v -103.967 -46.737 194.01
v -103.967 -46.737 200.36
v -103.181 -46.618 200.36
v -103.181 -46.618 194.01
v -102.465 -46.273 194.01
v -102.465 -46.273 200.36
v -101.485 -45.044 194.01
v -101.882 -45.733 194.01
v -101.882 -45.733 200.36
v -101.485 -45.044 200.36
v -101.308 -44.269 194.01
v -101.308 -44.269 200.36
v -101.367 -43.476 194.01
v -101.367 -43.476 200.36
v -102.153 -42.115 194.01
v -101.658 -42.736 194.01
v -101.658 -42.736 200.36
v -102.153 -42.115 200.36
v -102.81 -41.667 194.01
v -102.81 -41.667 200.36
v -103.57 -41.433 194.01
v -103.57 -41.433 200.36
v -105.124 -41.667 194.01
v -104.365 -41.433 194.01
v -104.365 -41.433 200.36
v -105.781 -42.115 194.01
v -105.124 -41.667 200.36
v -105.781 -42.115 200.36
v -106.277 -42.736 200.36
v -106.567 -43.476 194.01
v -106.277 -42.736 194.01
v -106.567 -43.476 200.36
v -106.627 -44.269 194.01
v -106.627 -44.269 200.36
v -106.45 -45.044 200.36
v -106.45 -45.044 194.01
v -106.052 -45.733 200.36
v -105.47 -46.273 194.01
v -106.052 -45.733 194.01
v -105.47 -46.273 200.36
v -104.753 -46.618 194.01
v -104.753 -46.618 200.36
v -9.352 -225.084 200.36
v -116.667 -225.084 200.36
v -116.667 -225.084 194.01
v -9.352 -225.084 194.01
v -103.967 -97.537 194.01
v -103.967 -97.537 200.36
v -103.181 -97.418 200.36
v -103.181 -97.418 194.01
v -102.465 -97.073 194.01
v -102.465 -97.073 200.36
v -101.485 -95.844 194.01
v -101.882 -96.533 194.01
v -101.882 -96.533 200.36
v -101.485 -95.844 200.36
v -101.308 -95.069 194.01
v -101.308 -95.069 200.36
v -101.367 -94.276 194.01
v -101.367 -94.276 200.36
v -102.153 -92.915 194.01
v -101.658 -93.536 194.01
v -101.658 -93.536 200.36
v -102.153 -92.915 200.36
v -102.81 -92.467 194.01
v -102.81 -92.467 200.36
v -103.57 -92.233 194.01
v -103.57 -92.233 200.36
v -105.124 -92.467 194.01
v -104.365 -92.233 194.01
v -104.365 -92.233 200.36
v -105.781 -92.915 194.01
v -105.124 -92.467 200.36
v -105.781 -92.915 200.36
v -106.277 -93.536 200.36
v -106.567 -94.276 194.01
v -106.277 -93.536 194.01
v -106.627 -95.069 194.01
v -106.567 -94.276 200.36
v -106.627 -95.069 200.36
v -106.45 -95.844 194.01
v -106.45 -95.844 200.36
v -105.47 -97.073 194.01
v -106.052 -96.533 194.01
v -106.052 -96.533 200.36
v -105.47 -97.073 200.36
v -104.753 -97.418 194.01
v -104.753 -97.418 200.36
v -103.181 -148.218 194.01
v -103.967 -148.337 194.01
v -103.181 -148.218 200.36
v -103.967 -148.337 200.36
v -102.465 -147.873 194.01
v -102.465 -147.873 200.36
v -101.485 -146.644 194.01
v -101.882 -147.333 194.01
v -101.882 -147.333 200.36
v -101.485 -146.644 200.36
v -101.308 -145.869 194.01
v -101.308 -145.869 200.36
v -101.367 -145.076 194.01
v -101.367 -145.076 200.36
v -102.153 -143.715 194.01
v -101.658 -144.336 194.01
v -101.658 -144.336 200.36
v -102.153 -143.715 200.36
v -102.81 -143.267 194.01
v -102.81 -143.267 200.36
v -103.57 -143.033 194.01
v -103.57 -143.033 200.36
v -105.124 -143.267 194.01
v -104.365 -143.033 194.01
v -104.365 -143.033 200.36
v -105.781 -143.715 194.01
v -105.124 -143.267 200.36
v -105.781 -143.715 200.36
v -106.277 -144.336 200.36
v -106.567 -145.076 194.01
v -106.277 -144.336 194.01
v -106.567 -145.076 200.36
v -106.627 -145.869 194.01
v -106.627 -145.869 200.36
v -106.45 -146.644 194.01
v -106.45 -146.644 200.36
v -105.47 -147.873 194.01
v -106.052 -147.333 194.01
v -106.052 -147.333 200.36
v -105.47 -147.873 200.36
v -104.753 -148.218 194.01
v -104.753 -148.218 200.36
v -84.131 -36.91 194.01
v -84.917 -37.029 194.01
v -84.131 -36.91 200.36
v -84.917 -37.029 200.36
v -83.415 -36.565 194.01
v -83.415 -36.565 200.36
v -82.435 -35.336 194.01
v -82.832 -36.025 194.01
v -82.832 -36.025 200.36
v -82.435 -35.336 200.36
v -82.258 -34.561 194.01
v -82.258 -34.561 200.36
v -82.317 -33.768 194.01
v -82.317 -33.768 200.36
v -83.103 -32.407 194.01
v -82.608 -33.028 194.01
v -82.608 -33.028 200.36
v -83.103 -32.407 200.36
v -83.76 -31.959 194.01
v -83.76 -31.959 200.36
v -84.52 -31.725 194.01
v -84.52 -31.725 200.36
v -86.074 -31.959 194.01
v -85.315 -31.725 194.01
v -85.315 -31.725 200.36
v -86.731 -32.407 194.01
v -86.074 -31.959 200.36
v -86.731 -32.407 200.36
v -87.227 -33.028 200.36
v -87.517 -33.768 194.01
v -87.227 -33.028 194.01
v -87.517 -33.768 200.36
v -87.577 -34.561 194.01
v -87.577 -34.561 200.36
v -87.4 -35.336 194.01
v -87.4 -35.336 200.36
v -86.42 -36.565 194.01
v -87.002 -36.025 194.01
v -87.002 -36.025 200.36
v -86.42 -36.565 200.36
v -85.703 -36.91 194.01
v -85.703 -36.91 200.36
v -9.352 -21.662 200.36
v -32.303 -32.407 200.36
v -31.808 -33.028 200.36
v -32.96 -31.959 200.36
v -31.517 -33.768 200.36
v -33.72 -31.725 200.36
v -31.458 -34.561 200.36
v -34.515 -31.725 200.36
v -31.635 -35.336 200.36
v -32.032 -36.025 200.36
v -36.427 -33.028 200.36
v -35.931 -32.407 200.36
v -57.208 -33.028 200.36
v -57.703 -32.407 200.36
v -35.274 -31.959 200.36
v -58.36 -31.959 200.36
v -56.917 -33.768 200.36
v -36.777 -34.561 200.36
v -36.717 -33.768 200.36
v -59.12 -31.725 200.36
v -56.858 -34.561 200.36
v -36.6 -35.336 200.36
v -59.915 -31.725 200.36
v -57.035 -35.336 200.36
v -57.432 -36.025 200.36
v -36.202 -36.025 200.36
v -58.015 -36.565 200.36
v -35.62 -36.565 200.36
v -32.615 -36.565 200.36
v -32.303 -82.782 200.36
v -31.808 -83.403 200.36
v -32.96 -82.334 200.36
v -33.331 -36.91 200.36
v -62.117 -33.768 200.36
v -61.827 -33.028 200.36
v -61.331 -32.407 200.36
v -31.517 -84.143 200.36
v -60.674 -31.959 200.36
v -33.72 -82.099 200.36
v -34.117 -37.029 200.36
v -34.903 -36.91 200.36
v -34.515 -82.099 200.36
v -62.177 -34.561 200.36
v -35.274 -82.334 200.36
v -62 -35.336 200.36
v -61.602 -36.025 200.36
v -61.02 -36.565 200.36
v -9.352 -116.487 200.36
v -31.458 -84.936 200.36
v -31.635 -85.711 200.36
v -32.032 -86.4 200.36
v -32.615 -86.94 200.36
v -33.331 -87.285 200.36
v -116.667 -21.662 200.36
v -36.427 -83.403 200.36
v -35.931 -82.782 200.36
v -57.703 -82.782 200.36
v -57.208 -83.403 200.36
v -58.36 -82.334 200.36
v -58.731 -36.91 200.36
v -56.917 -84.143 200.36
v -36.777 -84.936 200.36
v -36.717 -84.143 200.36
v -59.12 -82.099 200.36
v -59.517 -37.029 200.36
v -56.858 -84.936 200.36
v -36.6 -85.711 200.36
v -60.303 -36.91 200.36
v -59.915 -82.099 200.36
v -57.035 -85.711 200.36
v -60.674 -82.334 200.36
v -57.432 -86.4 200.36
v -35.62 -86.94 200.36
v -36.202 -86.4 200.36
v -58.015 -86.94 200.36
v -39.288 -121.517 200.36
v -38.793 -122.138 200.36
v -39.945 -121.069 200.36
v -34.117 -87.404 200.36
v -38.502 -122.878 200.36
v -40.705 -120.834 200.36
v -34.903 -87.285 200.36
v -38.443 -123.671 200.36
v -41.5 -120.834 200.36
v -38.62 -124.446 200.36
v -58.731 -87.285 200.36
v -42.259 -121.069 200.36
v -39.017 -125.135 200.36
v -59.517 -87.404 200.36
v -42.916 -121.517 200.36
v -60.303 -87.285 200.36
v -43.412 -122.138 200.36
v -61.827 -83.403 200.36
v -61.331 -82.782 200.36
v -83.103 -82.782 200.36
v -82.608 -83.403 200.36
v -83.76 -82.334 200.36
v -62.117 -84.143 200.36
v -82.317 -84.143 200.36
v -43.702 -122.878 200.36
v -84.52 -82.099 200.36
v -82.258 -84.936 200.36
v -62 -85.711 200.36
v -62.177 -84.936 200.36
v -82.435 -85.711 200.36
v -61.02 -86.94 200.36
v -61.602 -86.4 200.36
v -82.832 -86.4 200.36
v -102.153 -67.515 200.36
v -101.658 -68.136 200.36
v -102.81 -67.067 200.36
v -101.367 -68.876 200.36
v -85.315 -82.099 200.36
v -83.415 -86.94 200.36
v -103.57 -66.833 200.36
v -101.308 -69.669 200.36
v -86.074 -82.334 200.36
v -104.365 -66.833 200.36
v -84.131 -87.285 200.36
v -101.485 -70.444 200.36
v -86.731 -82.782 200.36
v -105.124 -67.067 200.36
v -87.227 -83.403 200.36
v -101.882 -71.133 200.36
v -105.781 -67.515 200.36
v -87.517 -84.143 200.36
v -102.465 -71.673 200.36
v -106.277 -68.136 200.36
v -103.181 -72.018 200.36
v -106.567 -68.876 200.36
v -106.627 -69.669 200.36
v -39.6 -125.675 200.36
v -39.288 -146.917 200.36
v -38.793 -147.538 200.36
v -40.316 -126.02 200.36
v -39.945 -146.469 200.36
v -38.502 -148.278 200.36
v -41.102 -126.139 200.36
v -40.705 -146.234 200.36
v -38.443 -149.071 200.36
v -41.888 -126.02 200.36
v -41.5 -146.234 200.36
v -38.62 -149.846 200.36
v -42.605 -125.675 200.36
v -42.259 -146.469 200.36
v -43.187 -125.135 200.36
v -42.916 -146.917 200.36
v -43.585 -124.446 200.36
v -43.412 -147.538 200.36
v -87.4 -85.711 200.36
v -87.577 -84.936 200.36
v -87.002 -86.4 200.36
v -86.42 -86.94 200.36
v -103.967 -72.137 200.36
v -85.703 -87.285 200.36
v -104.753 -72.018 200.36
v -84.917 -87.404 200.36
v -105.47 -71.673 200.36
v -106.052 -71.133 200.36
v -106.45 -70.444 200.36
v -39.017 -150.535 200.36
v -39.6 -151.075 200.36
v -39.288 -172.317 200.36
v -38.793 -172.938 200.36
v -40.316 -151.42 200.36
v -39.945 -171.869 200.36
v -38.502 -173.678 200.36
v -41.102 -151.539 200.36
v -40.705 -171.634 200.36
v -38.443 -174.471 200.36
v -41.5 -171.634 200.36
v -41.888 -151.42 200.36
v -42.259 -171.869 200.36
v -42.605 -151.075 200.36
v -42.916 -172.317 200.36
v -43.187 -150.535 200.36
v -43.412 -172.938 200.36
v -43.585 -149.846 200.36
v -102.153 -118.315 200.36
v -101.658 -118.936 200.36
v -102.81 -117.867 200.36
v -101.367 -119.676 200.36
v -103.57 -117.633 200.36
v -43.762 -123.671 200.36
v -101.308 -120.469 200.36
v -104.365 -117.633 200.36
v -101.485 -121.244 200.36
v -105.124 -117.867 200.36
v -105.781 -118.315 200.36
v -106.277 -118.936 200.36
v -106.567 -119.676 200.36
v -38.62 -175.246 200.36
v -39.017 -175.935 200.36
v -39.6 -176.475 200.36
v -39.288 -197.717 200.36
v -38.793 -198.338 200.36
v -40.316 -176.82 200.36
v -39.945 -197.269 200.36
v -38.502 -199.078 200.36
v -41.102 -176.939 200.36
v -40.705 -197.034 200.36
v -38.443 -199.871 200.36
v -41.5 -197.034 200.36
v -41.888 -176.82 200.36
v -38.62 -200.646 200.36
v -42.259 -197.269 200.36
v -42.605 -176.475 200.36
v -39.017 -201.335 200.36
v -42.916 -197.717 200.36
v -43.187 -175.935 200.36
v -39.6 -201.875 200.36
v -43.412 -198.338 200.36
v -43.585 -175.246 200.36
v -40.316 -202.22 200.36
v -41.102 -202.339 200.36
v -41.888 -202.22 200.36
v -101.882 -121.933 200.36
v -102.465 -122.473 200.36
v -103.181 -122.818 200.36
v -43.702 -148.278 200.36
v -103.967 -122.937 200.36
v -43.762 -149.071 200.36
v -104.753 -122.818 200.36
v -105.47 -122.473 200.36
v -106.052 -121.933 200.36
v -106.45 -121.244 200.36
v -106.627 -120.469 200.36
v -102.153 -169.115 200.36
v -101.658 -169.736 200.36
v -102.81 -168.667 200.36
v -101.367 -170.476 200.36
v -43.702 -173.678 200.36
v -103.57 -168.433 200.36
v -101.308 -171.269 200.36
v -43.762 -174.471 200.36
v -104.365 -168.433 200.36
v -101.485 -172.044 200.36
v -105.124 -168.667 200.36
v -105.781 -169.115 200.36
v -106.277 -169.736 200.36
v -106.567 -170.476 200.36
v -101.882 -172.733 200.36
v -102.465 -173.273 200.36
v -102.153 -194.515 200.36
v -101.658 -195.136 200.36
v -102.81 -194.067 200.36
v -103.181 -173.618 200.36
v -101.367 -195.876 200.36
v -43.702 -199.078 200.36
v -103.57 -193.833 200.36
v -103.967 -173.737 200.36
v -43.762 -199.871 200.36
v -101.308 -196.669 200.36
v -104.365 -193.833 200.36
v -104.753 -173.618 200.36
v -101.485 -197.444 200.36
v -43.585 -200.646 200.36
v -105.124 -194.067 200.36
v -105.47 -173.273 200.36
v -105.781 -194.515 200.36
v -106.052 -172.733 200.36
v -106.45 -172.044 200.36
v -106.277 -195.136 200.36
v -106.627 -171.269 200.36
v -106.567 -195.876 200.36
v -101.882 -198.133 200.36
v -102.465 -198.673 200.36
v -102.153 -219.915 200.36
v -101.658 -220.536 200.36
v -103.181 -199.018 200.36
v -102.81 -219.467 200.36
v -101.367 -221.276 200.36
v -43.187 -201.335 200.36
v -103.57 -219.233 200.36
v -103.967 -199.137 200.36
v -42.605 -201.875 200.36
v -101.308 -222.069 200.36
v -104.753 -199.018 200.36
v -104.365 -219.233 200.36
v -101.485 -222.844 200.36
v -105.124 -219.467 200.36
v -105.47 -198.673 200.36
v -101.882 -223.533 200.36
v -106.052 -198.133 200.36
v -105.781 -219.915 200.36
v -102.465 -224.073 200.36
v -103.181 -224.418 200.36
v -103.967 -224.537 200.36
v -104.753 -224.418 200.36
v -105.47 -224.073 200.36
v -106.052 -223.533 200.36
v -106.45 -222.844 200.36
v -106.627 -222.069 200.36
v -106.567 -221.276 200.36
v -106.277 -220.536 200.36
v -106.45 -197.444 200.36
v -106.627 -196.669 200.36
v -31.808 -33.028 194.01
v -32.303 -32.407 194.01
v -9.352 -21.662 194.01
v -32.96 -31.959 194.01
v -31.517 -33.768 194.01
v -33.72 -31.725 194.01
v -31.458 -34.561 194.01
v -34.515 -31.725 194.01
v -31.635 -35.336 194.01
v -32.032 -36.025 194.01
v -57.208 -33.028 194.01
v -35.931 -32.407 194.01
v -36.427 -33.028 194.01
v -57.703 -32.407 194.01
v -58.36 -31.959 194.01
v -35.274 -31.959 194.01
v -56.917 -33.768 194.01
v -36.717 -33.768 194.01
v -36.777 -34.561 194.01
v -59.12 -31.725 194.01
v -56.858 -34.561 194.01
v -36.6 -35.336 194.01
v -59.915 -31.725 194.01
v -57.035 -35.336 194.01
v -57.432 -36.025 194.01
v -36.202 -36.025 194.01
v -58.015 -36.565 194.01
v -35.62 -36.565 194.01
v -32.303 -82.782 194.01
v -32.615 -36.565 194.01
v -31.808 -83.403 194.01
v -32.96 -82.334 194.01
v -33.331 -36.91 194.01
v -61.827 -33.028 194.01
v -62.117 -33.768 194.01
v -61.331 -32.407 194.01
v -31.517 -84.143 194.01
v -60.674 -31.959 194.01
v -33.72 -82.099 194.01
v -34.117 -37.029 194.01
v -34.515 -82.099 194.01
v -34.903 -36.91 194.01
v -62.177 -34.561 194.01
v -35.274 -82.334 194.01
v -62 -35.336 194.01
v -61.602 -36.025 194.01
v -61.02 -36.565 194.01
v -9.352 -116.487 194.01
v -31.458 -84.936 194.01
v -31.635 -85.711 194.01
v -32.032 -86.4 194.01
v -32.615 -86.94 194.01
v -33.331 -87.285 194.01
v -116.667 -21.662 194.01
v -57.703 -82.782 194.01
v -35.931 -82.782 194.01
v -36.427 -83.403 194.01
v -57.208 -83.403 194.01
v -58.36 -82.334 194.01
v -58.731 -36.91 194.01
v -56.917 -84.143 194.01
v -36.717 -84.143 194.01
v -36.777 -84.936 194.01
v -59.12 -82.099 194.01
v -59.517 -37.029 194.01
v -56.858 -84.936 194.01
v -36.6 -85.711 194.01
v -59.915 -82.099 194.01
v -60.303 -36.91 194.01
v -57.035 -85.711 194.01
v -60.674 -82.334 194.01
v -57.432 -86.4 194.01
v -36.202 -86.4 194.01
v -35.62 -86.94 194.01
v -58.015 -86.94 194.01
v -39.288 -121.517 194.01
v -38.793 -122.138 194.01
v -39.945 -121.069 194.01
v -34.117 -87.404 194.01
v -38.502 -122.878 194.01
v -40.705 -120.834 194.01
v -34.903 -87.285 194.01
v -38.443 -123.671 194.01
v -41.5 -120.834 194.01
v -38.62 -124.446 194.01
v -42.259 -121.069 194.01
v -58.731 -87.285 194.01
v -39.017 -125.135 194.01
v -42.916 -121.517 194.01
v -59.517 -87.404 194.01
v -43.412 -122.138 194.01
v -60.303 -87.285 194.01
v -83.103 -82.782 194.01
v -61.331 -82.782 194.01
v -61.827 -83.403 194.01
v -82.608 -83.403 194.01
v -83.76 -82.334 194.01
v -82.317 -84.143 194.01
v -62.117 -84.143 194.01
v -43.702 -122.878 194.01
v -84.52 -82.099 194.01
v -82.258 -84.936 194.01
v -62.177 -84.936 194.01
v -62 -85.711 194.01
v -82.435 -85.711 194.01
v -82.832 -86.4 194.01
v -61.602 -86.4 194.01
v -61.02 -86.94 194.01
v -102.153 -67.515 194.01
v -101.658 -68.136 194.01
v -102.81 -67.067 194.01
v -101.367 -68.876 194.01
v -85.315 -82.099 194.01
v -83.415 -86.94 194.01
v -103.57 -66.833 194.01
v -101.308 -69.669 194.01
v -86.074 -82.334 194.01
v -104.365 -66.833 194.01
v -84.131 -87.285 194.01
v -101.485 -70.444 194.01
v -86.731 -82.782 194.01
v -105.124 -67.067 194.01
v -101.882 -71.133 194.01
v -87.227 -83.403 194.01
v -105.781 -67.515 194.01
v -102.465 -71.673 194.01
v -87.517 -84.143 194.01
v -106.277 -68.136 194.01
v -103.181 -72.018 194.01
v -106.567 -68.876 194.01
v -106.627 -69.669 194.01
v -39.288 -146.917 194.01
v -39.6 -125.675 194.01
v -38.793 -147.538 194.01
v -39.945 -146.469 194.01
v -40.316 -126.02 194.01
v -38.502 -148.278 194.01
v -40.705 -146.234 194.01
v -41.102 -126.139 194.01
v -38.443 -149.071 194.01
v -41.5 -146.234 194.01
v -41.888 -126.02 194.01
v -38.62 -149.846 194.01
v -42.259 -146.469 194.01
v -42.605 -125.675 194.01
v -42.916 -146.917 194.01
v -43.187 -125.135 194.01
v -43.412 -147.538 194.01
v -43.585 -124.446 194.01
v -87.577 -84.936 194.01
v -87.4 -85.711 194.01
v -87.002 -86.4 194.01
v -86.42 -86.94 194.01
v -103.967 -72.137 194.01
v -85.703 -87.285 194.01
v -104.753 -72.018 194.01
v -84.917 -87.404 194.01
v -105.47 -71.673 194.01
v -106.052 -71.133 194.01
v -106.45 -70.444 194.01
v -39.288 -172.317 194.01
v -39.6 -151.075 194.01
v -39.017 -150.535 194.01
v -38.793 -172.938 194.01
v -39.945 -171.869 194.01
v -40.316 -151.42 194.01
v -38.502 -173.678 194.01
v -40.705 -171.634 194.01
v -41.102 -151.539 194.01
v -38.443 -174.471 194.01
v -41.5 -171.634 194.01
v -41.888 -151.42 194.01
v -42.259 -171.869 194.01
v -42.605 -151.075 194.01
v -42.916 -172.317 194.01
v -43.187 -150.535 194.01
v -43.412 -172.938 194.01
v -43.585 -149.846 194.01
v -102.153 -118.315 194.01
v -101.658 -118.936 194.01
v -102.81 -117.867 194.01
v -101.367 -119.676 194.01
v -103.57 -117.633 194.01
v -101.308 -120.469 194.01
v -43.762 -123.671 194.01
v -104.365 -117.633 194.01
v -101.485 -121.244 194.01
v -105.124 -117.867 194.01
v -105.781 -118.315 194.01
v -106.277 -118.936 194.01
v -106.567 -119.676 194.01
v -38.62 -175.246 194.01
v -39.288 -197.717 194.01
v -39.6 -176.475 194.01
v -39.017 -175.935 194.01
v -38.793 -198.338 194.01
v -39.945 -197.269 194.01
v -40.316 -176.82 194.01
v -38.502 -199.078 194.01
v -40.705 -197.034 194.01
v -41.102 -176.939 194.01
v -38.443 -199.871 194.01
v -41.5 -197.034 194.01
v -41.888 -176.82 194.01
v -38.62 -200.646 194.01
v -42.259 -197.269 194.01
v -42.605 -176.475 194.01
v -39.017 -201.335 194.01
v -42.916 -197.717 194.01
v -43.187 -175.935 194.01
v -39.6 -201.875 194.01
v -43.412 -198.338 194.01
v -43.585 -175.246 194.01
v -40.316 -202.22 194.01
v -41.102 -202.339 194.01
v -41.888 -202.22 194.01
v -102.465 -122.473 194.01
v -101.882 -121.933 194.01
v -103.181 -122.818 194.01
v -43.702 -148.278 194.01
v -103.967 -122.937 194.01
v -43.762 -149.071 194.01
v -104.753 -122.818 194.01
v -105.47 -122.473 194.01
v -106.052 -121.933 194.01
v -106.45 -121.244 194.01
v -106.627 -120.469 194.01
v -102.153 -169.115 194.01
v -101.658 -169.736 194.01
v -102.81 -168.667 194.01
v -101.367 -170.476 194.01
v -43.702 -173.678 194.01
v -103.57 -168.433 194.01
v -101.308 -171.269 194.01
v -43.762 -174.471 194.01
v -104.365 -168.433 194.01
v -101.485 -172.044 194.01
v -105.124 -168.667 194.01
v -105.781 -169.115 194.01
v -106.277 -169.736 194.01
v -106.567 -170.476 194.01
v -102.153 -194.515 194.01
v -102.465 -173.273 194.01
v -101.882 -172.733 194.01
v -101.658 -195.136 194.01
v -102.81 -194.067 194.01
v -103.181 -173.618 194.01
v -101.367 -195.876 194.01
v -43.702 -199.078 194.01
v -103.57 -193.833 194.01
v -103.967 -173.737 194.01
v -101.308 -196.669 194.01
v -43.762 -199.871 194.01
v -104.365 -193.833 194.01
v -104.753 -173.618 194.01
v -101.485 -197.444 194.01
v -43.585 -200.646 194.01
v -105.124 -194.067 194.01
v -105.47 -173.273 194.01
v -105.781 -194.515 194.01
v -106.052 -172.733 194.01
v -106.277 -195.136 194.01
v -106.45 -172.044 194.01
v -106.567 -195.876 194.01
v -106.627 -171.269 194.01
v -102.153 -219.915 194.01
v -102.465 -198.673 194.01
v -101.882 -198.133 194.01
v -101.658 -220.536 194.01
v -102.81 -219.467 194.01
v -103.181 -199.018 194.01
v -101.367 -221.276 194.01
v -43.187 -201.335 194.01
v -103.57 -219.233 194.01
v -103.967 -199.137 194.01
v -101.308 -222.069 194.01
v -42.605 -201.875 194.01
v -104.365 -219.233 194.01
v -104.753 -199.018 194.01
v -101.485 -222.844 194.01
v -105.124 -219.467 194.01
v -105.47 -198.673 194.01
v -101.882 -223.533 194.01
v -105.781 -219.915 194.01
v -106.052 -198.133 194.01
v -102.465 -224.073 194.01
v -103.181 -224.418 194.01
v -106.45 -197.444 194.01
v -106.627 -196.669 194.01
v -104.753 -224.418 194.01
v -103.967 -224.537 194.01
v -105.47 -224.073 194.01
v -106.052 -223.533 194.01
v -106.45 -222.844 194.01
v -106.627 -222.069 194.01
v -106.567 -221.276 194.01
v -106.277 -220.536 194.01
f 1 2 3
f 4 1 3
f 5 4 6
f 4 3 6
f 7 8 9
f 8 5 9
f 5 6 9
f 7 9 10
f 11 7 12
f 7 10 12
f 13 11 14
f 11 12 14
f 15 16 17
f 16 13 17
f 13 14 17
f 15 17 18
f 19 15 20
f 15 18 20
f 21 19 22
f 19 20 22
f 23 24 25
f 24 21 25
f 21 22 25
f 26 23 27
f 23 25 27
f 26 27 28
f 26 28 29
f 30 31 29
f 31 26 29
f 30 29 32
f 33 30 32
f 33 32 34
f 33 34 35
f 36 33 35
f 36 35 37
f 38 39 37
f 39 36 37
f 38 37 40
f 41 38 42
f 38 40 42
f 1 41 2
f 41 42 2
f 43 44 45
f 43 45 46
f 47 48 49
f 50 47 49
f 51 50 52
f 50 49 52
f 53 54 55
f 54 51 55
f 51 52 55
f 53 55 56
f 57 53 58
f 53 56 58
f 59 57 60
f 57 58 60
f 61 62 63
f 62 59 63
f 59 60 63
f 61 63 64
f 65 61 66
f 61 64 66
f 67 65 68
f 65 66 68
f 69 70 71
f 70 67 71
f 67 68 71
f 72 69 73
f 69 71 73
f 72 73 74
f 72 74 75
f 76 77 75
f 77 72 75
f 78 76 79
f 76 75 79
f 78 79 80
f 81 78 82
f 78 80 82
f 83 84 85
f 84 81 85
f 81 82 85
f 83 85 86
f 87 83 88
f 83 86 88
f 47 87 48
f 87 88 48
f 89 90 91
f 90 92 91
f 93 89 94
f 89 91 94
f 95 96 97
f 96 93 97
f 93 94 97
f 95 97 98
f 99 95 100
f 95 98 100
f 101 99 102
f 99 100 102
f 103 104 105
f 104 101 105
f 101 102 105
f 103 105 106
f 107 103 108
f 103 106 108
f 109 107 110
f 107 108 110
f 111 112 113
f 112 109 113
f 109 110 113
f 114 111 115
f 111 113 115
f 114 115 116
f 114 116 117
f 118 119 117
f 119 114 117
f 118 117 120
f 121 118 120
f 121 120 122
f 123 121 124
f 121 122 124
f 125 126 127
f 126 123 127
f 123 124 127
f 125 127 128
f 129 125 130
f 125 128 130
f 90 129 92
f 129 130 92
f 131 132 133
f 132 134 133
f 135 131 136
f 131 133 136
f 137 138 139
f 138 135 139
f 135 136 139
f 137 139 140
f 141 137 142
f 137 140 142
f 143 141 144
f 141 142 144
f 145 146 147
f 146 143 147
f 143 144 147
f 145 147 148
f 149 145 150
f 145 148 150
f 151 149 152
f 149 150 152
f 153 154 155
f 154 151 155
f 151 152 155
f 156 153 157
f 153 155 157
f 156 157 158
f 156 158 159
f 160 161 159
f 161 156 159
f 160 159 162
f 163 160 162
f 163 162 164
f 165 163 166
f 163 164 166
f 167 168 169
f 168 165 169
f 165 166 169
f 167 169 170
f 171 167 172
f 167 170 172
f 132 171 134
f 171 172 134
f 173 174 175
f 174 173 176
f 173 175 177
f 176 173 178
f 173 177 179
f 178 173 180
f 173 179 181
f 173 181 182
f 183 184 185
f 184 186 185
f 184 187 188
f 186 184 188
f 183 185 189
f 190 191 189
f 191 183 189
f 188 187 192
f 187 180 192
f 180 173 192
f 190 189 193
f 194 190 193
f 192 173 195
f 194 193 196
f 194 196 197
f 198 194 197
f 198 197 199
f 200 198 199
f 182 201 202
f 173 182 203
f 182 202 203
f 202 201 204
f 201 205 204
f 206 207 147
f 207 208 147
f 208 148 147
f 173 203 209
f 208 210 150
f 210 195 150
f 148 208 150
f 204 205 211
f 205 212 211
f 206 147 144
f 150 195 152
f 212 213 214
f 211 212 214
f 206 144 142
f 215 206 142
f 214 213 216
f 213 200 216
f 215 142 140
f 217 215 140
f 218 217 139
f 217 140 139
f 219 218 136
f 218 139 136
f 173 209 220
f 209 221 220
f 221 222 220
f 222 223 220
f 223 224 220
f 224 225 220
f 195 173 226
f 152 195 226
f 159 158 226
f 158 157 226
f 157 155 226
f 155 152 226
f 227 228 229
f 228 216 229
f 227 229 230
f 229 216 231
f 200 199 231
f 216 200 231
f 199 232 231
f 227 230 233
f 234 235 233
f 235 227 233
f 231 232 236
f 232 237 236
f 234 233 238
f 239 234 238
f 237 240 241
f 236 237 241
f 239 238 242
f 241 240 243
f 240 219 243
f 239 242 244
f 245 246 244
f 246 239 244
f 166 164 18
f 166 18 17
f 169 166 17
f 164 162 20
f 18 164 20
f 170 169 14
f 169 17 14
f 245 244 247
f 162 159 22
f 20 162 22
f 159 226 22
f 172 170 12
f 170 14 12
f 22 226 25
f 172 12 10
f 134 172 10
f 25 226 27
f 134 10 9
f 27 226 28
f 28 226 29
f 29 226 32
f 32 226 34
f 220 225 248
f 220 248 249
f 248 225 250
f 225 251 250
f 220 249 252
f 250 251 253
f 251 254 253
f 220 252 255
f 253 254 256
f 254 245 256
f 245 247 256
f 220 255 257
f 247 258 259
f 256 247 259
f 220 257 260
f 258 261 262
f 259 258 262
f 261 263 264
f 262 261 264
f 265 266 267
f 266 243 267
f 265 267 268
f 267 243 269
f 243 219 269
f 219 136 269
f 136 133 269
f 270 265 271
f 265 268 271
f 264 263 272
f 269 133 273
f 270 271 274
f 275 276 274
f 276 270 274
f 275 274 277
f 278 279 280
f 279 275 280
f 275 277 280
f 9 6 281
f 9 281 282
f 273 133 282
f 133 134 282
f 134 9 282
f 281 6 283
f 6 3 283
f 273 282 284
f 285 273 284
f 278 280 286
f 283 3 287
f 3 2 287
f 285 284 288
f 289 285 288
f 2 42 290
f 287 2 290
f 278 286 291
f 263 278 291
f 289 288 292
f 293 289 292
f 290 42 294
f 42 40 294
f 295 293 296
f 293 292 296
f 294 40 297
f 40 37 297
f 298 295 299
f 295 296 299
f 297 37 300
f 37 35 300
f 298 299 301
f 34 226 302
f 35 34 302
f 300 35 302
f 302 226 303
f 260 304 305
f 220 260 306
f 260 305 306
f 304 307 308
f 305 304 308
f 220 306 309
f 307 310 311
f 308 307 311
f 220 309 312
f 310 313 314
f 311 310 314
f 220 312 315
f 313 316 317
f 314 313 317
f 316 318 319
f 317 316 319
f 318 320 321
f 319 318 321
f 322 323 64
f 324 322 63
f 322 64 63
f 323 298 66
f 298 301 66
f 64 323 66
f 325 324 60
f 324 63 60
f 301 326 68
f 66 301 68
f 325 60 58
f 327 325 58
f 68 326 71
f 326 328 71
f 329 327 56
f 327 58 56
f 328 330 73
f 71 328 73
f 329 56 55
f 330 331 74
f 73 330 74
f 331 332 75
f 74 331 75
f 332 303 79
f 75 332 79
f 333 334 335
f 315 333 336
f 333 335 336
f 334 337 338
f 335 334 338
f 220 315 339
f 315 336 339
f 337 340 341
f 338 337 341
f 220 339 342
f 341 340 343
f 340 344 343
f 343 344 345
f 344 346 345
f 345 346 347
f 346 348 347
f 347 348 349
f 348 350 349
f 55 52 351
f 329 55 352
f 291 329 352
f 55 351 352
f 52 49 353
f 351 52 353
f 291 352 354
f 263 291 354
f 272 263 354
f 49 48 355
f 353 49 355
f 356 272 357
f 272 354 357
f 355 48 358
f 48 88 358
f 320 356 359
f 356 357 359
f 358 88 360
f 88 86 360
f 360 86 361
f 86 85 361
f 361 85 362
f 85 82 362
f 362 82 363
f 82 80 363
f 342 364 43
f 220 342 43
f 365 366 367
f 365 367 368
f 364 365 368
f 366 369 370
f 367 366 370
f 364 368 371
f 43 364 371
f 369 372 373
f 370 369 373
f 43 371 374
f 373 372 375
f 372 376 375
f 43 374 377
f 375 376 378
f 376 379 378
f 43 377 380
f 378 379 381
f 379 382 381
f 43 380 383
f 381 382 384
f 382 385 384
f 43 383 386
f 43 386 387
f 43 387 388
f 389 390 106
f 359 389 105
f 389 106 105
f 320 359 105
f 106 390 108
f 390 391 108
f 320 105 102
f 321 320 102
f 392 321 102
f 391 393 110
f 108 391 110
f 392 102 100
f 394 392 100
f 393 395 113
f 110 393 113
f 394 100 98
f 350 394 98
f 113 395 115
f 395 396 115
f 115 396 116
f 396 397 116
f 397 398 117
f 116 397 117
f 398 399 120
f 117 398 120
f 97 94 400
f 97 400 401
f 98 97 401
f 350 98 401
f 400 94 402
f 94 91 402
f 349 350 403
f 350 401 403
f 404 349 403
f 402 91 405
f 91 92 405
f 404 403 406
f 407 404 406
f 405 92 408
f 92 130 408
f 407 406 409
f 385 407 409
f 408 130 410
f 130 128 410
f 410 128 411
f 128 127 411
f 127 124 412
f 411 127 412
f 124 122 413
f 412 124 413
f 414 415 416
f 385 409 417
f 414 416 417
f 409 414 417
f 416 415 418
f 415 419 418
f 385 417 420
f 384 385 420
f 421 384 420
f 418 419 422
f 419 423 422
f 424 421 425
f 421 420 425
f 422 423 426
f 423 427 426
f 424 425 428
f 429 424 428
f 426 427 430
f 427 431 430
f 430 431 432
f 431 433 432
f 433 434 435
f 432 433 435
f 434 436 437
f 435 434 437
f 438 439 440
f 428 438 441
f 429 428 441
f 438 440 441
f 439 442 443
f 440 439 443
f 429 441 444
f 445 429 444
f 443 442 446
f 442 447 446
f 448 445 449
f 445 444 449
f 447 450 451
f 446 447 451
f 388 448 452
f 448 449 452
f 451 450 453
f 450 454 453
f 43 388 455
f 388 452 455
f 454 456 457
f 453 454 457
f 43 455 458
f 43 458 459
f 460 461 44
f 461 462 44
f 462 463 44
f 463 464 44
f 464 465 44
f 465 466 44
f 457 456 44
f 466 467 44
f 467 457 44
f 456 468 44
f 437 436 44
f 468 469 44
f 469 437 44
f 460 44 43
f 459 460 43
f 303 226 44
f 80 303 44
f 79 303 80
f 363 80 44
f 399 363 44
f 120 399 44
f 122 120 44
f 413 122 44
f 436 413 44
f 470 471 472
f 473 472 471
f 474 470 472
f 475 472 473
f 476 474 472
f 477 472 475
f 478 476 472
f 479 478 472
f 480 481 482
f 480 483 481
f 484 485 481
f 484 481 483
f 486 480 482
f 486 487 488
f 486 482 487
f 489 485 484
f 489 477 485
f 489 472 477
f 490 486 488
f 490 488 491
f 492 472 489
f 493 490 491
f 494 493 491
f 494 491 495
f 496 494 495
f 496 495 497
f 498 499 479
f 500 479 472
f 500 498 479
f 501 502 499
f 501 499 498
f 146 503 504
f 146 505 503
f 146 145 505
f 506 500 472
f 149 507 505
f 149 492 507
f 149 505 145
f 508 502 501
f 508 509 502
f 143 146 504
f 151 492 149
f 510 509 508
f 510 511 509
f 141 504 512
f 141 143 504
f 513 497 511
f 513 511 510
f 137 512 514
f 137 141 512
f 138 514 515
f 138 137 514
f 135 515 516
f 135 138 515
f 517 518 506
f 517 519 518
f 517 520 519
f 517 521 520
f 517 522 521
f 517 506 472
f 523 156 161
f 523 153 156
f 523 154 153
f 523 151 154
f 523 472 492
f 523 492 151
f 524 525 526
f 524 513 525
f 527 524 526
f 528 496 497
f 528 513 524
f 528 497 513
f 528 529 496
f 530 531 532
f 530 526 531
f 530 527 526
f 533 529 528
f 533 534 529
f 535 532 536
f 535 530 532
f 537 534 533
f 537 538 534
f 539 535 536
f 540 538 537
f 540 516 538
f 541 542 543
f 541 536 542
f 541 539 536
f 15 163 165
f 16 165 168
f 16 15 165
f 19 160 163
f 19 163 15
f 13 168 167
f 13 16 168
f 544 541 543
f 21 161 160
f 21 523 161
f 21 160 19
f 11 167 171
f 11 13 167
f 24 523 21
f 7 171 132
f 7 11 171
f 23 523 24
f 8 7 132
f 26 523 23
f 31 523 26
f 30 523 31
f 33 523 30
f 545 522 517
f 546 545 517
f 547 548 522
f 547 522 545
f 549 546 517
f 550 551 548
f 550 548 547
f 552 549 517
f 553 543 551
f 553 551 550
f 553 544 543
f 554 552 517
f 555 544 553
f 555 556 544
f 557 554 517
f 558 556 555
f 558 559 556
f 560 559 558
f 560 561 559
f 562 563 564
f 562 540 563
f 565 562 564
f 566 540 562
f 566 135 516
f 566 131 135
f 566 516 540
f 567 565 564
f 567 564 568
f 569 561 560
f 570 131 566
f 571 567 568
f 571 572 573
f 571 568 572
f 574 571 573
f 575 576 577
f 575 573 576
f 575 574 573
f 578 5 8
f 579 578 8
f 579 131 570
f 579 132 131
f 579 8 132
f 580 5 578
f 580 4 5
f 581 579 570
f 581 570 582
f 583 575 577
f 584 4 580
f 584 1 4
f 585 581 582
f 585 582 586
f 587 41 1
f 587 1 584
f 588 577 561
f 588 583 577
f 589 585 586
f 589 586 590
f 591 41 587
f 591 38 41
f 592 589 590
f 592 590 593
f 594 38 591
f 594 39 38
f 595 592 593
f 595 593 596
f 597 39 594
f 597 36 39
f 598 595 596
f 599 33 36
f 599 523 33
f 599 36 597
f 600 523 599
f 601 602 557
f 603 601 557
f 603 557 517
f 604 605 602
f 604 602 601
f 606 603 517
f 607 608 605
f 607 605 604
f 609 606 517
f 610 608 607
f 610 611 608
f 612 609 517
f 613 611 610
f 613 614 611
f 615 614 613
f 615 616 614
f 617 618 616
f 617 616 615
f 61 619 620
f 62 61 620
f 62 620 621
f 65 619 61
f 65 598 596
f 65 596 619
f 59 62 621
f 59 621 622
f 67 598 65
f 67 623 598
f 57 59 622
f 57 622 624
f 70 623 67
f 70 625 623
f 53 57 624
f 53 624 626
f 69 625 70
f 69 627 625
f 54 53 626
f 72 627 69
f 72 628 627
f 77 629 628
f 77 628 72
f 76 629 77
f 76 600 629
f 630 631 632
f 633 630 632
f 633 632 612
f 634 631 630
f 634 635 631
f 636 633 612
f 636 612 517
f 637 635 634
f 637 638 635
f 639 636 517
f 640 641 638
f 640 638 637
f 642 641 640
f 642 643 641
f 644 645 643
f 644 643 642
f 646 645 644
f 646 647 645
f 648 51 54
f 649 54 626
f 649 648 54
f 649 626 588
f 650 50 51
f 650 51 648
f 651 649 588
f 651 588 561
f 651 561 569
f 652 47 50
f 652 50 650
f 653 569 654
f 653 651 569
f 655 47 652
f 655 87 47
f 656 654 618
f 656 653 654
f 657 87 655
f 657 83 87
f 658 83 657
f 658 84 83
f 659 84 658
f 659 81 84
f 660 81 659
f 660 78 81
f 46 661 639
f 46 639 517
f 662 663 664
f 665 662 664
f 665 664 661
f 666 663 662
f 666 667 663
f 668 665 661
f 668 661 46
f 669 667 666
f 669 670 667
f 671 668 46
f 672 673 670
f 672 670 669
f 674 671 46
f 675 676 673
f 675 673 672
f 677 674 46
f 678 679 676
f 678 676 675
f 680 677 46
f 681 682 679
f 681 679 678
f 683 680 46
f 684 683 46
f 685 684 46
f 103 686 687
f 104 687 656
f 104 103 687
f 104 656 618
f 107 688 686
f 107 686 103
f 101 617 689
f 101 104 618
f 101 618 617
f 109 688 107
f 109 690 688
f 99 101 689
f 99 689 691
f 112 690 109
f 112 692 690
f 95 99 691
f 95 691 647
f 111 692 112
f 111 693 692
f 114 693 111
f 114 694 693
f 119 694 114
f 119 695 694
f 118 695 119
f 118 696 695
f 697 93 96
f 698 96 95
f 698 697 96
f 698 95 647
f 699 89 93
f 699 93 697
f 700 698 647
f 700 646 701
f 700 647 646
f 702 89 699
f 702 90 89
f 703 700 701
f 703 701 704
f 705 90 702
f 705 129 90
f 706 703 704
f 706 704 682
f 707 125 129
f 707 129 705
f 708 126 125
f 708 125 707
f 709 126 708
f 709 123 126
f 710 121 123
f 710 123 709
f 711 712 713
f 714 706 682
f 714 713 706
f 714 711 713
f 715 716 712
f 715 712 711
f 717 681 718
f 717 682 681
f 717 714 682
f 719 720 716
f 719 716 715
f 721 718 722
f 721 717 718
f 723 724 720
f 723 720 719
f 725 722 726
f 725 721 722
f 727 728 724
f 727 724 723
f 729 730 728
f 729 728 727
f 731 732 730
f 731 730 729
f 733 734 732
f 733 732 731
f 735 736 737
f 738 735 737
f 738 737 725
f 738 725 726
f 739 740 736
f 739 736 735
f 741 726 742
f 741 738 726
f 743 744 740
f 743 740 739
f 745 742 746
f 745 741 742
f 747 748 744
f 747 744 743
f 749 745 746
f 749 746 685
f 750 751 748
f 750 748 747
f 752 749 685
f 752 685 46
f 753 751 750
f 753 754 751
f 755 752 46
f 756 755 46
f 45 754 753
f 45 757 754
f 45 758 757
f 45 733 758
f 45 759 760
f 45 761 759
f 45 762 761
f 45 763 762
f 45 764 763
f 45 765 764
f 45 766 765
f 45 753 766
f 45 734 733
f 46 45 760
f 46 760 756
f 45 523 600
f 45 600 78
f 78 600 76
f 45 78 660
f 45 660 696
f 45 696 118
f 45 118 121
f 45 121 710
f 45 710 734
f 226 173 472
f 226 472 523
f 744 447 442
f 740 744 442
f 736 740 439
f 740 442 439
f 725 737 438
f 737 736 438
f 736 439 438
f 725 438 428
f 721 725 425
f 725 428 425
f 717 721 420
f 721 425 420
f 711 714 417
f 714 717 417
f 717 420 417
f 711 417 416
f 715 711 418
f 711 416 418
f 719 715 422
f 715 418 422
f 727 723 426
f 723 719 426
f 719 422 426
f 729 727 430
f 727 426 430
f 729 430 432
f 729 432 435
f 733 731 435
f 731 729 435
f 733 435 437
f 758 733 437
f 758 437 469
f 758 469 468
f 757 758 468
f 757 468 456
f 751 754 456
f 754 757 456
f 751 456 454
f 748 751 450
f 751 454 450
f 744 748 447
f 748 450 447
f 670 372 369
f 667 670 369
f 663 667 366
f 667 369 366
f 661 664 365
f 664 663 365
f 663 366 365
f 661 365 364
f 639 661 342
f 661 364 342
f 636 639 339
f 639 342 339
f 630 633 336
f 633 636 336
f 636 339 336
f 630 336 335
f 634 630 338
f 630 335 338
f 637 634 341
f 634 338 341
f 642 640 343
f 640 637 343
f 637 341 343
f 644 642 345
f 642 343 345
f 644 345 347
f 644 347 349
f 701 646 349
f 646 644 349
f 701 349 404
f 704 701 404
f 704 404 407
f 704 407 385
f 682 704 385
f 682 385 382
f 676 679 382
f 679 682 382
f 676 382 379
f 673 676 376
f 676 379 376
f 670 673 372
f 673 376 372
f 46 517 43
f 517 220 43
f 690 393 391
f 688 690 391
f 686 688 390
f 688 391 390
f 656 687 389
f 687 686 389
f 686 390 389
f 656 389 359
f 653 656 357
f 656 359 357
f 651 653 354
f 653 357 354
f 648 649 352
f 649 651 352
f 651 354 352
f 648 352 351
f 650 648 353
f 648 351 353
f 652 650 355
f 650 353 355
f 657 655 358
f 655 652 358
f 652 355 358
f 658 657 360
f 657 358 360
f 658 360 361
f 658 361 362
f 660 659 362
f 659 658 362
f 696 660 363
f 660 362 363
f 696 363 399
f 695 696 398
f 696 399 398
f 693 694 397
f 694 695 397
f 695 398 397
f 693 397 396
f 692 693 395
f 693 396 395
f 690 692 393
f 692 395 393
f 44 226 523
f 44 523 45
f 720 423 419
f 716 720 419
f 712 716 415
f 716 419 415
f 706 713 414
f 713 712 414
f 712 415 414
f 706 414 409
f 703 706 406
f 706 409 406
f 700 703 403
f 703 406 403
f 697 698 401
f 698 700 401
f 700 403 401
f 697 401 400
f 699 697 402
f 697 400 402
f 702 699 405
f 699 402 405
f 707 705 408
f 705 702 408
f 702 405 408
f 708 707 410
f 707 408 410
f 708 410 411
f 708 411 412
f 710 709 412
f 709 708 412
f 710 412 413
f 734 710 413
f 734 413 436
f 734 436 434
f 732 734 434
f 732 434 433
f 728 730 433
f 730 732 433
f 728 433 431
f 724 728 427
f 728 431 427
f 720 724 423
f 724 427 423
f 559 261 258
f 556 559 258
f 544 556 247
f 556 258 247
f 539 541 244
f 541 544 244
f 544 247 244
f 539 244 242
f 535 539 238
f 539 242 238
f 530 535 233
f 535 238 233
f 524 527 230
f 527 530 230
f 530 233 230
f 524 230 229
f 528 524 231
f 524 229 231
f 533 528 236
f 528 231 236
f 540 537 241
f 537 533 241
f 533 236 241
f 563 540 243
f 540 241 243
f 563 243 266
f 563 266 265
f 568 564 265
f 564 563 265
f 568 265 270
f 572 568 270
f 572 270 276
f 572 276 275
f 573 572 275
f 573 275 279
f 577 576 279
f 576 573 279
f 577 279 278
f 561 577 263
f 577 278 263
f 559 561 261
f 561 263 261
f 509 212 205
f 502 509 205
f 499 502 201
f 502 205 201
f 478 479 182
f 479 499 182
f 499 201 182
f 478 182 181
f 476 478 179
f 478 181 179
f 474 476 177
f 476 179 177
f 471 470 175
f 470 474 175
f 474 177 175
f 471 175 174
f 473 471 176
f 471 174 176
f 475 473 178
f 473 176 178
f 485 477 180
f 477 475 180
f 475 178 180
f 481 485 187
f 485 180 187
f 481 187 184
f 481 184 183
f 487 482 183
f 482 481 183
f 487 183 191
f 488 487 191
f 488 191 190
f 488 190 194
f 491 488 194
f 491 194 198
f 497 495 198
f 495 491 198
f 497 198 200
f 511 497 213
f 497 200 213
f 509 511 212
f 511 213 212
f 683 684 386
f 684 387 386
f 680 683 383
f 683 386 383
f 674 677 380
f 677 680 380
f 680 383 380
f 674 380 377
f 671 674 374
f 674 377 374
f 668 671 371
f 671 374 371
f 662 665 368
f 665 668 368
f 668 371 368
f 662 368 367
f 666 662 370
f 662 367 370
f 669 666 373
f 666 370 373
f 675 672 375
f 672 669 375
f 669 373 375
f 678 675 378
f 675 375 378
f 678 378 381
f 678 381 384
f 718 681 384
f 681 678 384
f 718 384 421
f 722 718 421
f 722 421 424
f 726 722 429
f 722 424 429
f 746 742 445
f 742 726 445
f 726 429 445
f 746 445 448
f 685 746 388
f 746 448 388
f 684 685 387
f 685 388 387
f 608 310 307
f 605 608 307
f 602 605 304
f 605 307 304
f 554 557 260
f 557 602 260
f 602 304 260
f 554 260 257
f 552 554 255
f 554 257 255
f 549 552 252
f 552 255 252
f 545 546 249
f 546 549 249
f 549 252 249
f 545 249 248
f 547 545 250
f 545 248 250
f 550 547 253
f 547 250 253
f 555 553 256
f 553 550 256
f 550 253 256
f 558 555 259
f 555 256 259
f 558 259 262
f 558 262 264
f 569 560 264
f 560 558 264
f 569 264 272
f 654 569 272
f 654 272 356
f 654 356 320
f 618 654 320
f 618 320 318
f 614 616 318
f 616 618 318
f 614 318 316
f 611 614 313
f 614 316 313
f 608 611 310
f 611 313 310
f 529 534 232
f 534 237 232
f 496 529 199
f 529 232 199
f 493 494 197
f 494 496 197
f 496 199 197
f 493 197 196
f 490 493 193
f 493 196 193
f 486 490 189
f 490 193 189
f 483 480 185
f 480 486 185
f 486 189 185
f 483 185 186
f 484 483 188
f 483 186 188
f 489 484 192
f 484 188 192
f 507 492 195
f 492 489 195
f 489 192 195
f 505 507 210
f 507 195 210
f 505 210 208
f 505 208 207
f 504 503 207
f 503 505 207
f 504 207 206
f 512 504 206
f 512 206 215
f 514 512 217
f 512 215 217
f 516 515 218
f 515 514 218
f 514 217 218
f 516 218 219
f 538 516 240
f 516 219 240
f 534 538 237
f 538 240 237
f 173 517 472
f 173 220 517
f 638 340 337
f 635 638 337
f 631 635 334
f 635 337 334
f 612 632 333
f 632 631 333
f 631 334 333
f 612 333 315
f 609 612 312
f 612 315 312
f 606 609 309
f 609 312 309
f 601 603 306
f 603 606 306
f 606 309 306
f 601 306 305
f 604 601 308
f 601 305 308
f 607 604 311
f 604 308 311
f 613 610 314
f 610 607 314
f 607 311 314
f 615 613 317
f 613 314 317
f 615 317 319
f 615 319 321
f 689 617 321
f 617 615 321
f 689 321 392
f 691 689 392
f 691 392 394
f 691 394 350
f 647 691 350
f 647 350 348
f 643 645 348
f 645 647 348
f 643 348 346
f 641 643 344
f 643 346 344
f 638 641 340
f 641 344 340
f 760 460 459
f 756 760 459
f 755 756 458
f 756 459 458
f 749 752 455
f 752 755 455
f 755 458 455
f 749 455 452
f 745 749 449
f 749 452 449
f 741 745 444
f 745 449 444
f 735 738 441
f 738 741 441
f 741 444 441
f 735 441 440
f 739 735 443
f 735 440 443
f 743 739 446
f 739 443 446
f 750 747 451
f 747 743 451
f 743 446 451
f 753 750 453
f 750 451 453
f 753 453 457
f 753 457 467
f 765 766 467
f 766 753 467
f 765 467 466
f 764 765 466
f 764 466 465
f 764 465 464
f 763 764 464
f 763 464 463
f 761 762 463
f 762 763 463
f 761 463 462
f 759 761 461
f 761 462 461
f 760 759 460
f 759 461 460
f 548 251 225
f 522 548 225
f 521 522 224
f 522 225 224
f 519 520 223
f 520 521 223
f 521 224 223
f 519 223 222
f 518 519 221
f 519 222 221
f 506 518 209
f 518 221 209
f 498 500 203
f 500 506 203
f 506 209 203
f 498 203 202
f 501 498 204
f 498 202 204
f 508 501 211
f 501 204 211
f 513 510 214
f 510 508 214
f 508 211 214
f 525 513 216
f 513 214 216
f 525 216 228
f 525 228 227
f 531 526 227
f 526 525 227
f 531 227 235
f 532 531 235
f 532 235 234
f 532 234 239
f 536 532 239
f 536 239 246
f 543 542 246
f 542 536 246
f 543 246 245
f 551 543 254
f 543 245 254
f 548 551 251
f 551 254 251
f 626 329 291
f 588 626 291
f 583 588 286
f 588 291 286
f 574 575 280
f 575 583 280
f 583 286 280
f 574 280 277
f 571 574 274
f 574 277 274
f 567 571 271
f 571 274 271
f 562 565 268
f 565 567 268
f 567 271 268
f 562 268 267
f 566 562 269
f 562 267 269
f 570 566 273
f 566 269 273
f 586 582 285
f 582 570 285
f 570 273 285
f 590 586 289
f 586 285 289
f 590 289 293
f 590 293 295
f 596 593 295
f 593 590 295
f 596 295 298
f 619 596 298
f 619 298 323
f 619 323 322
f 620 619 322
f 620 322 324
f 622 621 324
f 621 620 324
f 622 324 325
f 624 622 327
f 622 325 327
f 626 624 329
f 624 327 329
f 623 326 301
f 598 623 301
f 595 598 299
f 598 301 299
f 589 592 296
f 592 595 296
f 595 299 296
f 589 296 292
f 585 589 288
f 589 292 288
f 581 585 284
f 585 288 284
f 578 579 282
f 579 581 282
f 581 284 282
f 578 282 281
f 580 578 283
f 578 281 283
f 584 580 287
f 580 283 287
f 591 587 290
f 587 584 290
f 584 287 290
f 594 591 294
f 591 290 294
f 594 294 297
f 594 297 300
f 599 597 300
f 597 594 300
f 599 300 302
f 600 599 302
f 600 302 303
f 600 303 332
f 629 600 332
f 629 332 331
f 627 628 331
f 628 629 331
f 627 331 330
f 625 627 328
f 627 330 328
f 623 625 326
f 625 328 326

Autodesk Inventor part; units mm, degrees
ref_plane "YZ Plane" through (0, 0, 0) normal (1, 0, 0) x (0, 1, 0)
ref_plane "XZ Plane" through (0, 0, 0) normal (0, 1, 0) x (-1, 0, 0)
ref_plane "XY Plane" through (0, 0, 0) normal (0, 0, 1) x (1, 0, 0)
ref_plane "Work Plane1" through (-113.4922, 95.6302, 200.3599) normal (-0.0001, 0, -1) x (0, -1, 0)
sketch "Sketch1" plane through (-113.4922, 95.6302, 200.3599) normal (-0.0001, 0, -1) x (0, -1, 0)
  line L0 (212.1169, -104.14) -> (330.2269, -104.14) projected
  line L1 (117.2921, 3.175) -> (320.7139, 3.175)
  line L2 (320.7139, 3.175) -> (320.7139, -104.14)
  line L3 (320.7139, -104.14) -> (117.2921, -104.14)
  line L4 (117.2921, -104.14) -> (117.2921, 3.175)
  circle A0 centre (129.9921, -79.375) radius 2.667 projected
  circle A1 centre (129.9921, -53.975) radius 2.667 projected
  circle A2 centre (129.9921, -28.575) radius 2.667 projected
  circle A3 centre (139.7, -9.525) radius 2.667 projected
  circle A4 centre (165.1, -9.525) radius 2.667 projected
  circle A5 centre (180.3669, -28.575) radius 2.667 projected
  circle A6 centre (180.3669, -53.975) radius 2.667 projected
  circle A7 centre (180.3669, -79.375) radius 2.667 projected
  circle A8 centre (292.1, -9.525) radius 2.667 projected
  circle A9 centre (317.5, -9.525) radius 2.667 projected
  circle A10 centre (266.7, -9.525) radius 2.667 projected
  circle A11 centre (241.3, -9.525) radius 2.667 projected
  circle A12 centre (215.9, -9.525) radius 2.667 projected
  circle A13 centre (190.5, -9.525) radius 2.667 projected
  circle A14 centre (295.3019, -72.39) radius 2.667 projected
  circle A15 centre (269.9019, -72.39) radius 2.667 projected
  circle A16 centre (244.5019, -72.39) radius 2.667 projected
  circle A17 centre (219.1019, -72.39) radius 2.667 projected
  point P0 (95.6298, -113.5035)
extrude "Extrusion1" add sketch "Sketch1" along normal blind 6.35
properties part number "Aluminum Final"
